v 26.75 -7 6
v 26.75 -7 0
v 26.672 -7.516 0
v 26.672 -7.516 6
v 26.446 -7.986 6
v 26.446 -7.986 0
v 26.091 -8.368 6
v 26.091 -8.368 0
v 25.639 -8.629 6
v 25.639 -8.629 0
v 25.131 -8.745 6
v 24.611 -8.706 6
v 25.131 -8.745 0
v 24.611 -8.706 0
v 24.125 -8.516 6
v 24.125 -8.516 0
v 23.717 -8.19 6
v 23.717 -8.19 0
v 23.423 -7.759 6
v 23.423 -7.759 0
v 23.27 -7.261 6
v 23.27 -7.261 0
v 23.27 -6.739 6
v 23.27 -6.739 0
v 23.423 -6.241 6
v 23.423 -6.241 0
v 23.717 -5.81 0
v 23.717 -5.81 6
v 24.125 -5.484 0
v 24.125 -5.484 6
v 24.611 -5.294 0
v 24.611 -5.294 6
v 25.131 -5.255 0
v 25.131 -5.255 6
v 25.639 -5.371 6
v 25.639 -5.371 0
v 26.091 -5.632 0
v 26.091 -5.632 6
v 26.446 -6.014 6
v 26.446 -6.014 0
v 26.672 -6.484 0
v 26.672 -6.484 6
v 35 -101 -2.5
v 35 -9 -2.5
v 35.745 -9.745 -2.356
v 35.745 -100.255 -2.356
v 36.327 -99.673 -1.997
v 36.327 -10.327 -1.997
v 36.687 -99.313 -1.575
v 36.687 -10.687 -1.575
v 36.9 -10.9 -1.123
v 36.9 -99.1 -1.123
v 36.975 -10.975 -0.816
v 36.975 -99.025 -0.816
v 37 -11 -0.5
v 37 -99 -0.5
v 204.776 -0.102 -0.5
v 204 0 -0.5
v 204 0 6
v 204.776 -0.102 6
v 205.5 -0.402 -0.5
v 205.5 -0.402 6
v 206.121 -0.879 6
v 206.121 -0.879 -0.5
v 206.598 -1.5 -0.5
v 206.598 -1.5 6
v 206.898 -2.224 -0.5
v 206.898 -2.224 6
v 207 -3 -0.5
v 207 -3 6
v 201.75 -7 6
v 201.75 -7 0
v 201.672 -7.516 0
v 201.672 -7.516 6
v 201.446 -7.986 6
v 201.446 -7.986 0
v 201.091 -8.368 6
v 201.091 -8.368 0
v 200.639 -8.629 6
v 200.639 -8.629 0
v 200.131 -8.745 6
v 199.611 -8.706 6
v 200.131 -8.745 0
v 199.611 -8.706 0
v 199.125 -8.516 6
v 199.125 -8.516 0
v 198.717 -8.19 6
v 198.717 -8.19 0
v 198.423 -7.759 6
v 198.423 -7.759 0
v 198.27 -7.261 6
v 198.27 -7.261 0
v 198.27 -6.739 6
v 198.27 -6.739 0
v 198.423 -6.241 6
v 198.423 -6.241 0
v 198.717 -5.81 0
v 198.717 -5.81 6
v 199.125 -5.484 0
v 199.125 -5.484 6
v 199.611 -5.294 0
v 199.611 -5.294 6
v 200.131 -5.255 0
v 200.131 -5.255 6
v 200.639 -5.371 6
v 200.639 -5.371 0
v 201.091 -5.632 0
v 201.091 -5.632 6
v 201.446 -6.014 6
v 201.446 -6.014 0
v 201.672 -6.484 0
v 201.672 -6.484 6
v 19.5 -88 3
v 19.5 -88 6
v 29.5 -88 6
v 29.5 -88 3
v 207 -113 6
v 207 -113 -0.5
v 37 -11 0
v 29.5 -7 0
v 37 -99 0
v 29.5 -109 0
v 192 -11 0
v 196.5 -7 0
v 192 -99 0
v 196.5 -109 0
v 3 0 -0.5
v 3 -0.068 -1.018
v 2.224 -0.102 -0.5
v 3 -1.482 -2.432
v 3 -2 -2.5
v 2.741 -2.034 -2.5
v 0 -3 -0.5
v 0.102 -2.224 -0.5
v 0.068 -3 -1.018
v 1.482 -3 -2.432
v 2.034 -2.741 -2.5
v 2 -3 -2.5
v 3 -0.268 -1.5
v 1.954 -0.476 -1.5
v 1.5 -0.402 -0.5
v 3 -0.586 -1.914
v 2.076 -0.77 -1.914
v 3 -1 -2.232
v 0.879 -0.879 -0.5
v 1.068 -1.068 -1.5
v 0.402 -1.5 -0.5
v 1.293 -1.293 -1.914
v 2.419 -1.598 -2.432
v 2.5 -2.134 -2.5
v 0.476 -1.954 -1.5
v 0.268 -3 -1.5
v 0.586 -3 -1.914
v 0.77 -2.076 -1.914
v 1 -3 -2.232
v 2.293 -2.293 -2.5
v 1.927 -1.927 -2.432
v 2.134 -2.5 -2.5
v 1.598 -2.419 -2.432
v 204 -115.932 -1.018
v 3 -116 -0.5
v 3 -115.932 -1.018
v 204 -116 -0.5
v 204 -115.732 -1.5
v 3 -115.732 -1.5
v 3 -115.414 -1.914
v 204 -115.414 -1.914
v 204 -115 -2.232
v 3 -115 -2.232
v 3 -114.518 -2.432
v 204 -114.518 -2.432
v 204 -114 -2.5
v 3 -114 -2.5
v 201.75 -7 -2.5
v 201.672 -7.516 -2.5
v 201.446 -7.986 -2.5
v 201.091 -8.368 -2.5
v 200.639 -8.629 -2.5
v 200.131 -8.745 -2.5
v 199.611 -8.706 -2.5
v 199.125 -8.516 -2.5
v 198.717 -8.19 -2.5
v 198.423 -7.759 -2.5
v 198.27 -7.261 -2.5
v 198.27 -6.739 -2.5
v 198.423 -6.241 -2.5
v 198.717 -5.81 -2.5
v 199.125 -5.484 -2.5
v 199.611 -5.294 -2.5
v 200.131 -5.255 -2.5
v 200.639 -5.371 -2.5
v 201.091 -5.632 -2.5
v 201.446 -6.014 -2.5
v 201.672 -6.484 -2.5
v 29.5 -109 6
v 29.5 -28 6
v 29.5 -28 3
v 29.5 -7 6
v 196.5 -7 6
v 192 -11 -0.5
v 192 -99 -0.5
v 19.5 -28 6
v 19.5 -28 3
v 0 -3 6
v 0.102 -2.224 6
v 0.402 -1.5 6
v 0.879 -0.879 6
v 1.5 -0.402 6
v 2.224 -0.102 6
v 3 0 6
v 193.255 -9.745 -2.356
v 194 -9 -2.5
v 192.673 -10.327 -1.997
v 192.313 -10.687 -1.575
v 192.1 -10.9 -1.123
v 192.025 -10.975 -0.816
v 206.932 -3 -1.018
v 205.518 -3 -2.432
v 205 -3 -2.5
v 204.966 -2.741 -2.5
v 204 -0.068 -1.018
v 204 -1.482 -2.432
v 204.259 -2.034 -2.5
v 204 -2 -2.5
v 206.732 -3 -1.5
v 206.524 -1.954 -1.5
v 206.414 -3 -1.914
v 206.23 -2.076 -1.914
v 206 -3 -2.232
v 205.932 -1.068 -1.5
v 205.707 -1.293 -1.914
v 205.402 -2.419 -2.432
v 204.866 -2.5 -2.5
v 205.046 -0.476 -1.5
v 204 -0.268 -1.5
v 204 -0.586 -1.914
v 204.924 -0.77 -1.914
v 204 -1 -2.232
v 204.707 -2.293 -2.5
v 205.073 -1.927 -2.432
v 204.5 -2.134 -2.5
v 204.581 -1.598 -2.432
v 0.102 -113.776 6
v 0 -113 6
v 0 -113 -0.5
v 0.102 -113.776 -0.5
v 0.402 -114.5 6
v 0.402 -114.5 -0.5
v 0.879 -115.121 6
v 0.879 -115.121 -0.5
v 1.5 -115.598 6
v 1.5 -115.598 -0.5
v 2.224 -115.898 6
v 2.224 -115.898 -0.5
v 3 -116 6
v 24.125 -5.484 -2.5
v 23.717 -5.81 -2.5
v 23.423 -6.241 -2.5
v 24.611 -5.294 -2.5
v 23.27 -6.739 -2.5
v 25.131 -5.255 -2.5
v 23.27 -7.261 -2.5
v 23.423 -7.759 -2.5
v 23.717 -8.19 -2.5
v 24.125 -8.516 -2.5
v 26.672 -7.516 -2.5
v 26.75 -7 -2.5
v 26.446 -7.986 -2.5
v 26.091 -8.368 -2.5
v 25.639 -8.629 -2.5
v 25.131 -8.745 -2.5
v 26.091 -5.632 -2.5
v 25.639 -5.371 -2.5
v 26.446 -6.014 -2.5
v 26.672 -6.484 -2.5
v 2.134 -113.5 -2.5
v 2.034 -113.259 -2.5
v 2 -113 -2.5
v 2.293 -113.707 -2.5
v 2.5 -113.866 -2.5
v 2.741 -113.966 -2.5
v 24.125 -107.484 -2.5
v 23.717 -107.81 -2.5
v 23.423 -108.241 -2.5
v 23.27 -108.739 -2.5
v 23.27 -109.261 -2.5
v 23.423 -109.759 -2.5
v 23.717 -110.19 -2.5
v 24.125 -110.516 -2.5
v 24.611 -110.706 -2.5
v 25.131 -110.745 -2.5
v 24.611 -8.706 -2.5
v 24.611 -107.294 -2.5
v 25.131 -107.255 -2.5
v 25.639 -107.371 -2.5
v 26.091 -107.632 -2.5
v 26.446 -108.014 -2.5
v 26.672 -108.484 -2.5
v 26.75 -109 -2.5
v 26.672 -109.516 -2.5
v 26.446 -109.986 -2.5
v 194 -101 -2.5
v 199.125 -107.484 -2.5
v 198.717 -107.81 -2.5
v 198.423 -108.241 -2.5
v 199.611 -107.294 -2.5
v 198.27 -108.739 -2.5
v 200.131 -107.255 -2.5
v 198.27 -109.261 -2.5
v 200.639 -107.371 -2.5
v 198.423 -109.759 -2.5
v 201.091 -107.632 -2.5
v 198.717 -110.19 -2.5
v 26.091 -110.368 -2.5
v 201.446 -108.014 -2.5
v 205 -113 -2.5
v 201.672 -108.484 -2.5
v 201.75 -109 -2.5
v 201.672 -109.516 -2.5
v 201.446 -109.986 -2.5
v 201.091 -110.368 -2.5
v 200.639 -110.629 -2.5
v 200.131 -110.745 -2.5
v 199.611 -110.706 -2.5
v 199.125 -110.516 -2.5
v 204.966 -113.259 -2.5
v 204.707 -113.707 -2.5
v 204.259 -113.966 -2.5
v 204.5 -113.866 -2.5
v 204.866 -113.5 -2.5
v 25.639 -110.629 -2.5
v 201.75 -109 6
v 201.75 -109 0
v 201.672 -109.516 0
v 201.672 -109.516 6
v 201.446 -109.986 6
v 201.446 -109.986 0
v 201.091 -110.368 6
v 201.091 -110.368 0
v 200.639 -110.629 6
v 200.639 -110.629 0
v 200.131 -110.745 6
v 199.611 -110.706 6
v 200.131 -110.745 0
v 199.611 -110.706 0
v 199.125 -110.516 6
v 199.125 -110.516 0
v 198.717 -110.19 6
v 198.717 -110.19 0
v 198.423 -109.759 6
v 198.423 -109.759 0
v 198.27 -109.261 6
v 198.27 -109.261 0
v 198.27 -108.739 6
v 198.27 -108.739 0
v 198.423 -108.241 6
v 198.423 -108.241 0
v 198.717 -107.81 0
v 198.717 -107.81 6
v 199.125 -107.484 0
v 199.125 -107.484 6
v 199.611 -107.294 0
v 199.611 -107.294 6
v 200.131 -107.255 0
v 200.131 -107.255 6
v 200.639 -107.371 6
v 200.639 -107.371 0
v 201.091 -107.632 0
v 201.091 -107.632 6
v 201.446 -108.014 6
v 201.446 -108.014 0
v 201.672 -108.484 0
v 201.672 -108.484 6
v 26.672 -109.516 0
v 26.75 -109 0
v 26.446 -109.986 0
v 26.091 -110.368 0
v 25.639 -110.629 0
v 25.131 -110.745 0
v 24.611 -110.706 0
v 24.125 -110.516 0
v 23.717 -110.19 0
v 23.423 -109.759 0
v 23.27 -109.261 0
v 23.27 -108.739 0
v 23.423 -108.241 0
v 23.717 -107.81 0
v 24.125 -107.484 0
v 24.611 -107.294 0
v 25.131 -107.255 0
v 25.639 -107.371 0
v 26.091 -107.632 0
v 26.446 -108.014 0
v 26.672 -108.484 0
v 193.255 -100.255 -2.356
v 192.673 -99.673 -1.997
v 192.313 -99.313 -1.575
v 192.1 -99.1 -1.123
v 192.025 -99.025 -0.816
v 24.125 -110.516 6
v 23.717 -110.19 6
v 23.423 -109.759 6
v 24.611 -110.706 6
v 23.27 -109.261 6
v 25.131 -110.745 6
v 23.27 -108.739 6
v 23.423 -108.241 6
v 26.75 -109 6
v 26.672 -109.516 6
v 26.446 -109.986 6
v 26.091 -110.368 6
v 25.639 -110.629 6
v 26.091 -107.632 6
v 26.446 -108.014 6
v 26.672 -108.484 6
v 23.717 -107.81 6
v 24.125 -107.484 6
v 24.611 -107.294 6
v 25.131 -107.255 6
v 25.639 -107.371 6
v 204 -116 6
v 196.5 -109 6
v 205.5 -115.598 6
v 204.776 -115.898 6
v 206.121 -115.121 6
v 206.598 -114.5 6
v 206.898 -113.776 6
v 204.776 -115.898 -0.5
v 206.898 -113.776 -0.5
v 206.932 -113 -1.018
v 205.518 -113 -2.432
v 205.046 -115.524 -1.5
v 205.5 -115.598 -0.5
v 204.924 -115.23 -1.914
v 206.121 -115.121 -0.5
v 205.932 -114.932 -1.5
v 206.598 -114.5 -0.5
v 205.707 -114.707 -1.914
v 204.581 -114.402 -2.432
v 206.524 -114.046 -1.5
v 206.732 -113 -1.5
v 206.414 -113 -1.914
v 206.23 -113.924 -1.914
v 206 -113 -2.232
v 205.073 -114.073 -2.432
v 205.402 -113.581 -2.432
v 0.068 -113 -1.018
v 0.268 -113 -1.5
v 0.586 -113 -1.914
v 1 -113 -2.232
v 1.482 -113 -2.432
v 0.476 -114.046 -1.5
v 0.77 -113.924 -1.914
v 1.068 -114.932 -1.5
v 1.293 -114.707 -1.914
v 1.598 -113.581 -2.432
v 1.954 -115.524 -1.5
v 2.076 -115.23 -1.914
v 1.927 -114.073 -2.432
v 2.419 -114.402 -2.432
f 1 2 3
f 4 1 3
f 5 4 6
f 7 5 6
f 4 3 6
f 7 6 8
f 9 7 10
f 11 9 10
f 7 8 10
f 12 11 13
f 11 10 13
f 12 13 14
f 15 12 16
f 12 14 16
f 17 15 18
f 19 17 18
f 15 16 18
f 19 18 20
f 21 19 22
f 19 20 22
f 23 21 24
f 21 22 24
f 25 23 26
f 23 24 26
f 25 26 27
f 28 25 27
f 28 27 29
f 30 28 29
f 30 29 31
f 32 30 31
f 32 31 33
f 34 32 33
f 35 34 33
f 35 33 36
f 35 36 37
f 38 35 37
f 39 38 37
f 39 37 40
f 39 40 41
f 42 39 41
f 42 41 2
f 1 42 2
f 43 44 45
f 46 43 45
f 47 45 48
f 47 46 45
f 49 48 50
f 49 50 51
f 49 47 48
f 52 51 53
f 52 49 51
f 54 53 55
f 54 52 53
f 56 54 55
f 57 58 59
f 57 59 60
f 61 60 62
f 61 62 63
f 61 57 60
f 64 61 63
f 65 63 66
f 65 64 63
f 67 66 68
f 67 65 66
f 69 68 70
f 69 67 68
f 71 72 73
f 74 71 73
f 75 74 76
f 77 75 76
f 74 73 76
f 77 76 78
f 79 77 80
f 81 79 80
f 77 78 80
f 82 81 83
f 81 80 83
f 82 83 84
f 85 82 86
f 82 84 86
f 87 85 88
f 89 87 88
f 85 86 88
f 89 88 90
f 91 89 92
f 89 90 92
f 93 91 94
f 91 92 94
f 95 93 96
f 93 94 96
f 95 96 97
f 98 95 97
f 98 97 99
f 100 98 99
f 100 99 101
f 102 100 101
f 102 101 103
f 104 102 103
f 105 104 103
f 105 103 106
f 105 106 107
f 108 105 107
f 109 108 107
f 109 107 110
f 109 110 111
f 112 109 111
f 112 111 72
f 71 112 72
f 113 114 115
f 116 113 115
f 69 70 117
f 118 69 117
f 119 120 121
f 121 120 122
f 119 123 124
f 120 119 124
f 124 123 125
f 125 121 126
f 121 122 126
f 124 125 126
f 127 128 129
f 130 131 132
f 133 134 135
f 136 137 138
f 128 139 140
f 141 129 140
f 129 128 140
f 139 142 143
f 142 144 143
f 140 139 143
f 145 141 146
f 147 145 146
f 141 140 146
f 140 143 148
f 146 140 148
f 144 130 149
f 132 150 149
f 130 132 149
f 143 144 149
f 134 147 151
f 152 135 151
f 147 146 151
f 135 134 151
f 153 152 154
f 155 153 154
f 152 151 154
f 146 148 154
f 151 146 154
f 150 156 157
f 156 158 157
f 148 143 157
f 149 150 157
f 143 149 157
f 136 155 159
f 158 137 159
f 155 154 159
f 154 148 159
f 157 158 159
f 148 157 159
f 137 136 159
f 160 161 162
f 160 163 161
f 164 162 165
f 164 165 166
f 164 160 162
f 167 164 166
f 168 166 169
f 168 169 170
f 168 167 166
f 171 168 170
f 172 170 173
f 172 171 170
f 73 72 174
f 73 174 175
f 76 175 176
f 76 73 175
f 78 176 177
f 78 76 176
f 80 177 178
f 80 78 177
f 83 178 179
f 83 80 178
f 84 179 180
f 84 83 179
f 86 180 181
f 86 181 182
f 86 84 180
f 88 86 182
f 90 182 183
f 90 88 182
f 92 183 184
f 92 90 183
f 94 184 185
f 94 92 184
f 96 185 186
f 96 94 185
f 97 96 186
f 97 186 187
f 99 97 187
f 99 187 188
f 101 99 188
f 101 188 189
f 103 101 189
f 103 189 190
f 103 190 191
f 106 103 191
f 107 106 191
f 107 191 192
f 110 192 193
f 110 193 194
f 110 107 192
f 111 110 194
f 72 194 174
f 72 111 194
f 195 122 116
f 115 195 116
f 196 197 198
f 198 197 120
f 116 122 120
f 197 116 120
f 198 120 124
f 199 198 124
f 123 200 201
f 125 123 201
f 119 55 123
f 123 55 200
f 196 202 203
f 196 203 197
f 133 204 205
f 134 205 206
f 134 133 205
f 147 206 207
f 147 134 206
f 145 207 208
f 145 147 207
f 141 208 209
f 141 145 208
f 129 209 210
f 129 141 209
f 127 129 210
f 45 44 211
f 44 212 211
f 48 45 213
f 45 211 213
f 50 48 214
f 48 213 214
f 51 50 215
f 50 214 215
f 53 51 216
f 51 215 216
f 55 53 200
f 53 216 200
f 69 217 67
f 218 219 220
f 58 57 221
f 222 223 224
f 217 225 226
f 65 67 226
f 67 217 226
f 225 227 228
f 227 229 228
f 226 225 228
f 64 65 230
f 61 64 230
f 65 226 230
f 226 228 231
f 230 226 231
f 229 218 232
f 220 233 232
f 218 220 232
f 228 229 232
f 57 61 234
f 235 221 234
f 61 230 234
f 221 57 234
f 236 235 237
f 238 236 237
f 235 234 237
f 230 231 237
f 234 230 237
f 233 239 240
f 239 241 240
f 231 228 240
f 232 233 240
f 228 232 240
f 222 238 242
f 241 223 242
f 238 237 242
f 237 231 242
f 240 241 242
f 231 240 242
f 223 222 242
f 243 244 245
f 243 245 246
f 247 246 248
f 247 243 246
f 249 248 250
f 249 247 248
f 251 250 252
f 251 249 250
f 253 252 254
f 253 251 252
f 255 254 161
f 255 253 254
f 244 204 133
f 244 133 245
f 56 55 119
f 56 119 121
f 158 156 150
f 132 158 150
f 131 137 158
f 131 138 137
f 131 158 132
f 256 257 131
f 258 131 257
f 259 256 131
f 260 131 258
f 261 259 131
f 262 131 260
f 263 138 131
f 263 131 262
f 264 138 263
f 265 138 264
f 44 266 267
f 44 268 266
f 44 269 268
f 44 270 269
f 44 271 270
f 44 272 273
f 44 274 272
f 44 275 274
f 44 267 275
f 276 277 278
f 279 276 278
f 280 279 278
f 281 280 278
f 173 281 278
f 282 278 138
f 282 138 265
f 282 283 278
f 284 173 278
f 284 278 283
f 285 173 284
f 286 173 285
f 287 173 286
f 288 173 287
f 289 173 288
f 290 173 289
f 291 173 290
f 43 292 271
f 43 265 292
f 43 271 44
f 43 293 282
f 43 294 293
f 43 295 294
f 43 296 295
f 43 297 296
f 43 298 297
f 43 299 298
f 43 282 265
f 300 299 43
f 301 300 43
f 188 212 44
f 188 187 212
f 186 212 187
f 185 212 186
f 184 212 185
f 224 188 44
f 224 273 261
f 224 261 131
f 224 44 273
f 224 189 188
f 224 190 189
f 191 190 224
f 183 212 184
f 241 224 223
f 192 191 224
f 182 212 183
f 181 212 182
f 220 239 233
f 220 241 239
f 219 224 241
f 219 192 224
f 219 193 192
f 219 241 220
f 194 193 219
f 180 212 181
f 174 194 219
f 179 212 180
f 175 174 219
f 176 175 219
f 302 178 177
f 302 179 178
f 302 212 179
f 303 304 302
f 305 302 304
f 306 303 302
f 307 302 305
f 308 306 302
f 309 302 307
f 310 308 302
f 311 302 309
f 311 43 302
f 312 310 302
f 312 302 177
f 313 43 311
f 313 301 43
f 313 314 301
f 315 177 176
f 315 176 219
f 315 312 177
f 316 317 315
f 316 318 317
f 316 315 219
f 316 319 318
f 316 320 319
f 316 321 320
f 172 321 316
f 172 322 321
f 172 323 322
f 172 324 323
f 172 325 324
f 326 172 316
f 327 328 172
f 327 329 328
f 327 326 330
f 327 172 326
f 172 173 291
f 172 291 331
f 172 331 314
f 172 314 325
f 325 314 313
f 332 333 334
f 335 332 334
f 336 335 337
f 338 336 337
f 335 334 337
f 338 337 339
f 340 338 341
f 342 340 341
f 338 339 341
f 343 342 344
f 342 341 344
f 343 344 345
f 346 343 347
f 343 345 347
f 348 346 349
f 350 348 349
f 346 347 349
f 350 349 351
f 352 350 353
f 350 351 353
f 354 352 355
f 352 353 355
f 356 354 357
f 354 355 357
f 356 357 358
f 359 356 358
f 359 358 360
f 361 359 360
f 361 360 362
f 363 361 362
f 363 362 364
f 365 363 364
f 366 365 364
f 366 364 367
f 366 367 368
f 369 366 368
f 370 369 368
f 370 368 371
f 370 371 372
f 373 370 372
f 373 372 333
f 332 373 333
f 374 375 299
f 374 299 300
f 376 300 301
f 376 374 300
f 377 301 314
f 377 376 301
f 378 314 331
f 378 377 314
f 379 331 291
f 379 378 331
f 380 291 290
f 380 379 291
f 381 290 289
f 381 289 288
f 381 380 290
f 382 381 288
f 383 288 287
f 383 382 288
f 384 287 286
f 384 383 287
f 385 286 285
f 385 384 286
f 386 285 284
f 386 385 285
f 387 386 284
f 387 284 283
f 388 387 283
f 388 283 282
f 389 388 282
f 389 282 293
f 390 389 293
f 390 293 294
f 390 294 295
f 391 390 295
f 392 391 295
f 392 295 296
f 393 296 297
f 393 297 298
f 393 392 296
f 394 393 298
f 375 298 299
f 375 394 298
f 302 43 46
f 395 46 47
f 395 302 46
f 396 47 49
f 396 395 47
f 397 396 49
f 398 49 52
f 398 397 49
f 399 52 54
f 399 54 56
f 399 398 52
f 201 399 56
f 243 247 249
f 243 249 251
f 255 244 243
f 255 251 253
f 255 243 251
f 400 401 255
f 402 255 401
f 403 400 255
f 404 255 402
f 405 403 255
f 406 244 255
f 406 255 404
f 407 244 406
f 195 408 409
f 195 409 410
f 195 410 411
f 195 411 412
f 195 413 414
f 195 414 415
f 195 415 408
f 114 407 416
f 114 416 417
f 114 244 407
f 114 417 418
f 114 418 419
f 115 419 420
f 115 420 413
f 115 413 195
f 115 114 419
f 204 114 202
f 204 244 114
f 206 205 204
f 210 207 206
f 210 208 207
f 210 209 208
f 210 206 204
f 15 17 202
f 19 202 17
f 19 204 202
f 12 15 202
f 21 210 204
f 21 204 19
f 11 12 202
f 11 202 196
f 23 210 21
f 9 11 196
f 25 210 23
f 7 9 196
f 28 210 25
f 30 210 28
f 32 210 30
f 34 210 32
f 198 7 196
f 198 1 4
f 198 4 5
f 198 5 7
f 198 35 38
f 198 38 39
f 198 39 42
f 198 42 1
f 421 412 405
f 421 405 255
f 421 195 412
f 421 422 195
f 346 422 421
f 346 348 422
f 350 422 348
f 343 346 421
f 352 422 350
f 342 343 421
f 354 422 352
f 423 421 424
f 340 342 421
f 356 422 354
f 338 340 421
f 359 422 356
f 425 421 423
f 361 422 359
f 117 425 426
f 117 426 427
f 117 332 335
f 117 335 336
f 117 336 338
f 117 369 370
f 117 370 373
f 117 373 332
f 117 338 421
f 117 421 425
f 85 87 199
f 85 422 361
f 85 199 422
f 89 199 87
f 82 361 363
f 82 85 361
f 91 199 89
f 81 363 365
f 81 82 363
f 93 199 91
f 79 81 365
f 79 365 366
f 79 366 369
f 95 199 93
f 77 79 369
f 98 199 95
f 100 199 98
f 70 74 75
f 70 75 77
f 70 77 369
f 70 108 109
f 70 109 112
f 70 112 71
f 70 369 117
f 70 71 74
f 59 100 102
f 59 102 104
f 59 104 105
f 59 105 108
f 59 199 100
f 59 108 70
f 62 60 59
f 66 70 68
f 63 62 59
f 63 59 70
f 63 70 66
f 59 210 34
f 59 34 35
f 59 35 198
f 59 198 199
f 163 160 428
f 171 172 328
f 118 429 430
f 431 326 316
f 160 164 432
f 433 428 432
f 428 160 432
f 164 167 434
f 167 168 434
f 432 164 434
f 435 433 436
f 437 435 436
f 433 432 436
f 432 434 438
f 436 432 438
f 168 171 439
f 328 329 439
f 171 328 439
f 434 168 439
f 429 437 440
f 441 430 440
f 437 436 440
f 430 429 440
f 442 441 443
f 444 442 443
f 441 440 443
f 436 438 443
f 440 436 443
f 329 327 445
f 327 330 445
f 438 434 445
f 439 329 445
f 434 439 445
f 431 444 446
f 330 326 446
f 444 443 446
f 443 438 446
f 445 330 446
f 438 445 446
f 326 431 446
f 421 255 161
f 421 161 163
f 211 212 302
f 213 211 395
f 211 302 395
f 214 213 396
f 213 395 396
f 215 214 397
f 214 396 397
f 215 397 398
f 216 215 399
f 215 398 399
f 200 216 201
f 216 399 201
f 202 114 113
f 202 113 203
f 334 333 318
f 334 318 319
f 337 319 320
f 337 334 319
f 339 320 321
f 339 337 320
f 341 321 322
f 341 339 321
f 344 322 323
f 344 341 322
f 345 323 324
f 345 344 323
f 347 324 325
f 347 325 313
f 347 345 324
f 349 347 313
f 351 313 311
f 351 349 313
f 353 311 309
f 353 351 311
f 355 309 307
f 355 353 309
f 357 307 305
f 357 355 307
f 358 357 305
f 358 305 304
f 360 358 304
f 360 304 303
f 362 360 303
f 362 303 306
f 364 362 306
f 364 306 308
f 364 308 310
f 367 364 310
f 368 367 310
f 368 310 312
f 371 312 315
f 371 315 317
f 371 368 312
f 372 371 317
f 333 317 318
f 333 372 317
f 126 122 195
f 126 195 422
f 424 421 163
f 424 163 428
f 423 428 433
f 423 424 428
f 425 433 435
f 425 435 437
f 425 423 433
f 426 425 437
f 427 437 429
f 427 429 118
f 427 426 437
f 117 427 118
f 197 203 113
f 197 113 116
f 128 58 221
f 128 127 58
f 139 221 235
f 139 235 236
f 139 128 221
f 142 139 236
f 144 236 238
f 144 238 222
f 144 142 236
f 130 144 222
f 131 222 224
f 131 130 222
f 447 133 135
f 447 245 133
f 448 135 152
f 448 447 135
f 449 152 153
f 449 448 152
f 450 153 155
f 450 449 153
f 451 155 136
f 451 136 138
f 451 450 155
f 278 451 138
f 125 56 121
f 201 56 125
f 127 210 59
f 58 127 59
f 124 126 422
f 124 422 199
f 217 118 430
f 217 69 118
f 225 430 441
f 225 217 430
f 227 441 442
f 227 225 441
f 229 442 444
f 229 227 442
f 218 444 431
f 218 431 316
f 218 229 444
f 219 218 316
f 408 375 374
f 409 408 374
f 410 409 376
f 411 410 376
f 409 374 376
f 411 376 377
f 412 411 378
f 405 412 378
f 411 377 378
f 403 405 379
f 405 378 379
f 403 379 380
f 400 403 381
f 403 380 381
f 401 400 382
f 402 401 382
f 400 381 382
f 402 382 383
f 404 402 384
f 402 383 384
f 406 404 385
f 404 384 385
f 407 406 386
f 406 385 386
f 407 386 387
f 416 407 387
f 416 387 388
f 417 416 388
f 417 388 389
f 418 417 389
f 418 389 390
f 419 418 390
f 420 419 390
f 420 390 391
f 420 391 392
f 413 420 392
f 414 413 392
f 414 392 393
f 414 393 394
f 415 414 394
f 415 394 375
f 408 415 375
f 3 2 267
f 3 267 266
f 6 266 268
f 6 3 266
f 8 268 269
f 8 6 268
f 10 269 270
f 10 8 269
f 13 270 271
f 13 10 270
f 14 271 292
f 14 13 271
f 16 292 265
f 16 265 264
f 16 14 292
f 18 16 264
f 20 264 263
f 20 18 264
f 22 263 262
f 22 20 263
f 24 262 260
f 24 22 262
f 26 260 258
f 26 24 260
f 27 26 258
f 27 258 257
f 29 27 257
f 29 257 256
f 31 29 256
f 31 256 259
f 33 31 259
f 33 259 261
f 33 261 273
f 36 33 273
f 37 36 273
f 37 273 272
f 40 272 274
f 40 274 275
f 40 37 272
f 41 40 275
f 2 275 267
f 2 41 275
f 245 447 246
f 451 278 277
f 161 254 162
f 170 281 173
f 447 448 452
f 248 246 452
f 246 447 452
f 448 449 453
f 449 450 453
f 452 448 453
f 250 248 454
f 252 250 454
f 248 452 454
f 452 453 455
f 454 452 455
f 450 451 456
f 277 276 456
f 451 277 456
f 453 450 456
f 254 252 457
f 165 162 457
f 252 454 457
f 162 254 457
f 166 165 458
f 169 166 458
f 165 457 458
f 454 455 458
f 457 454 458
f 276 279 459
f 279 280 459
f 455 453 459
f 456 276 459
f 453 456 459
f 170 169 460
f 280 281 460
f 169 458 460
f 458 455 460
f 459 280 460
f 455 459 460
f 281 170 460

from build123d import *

# Parameters (mm, degrees)
F0_W      = 207
F0_H      = 116
F1_DEPTH  = 6
F2_W      = 167
F2_H      = 102
F3_DEPTH  = 6
F4_R      = 1.75
F5_DEPTH  = 25
F6_W      = 10
F6_H      = 60
F7_DEPTH  = 3
F8_W      = 207
F8_H      = 116
F8_R      = 1.75
F8_W_2    = 167
F8_H_2    = 102
F9_DEPTH  = 2.5
F10_W     = 155
F10_H     = 88
F11_DEPTH = 25
F13_R     = 3
F14_R     = 2


with BuildPart() as f1:
    # F0 (on Top) → F1 (new body)
    with BuildSketch(Plane.XY):
        with Locations((103.5, -58)):
            Rectangle(F0_W, F0_H)
    extrude(amount=F1_DEPTH)

    # F2 (on face) → F3 (cut)
    with BuildSketch(Plane.XY):
        with Locations((113, -58)):
            Rectangle(F2_W, F2_H)
    extrude(amount=F3_DEPTH, mode=Mode.SUBTRACT)

    # F4 (on face) → F5 (cut)
    with BuildSketch(Plane(origin=(0, 0, 0), x_dir=(1, 0, 0), z_dir=(0, 0, -1))):
        with Locations((200, 7)):
            Circle(F4_R)
        with Locations((200, 109)):
            Circle(F4_R)
        with Locations((25, 109)):
            Circle(F4_R)
        with Locations((25, 7)):
            Circle(F4_R)
    extrude(amount=-F5_DEPTH, mode=Mode.SUBTRACT)

    # F6 (on face) → F7 (cut)
    with BuildSketch(Plane.XY.offset(6)):
        with Locations((24.5, -58)):
            Rectangle(F6_W, F6_H)
    extrude(amount=-F7_DEPTH, mode=Mode.SUBTRACT)

    # F8 (on face) → F9 (join)
    with BuildSketch(Plane(origin=(0, 0, 0), x_dir=(1, 0, 0), z_dir=(0, 0, -1))):
        with Locations((103.5, 58)):
            Rectangle(F8_W, F8_H)
        with Locations((25, 7)):
            Circle(F8_R, mode=Mode.SUBTRACT)
        with Locations((200, 7)):
            Circle(F8_R, mode=Mode.SUBTRACT)
        with Locations((25, 109)):
            Circle(F8_R, mode=Mode.SUBTRACT)
        with Locations((113, 58)):
            Rectangle(F8_W_2, F8_H_2, mode=Mode.SUBTRACT)
        with Locations((200, 109)):
            Circle(F8_R, mode=Mode.SUBTRACT)
        with Locations((113, 58)):
            Rectangle(F8_W_2, F8_H_2)
    extrude(amount=F9_DEPTH)

    # F10 (on face) → F11 (cut)
    with BuildSketch(Plane(origin=(0, 0, -2.5), x_dir=(1, 0, 0), z_dir=(0, 0, -1))):
        with Locations((114.5, 55)):
            Rectangle(F10_W, F10_H)
    extrude(amount=-F11_DEPTH, mode=Mode.SUBTRACT)

    # F13
    f13_edges = [f1.edges().sort_by_distance(p)[0] for p in [
        (207, 0, 1.75),
        (0, 0, 1.75),
        (207, -116, 1.75),
        (0, -116, 1.75),
    ]]
    fillet(f13_edges, radius=F13_R)

    # F14
    f14_edges = [f1.edges().sort_by_distance(p)[0] for p in [
        (0, -58, -2.5),
        (114.5, -99, -2.5),
        (37, -55, -2.5),
        (192, -55, -2.5),
        (114.5, -11, -2.5),
        (103.5, 0, -2.5),
        (206.12132, -0.87868, -2.5),
        (0.87868, -0.87868, -2.5),
        (207, -58, -2.5),
        (0.87868, -115.12132, -2.5),
        (206.12132, -115.12132, -2.5),
        (103.5, -116, -2.5),
    ]]
    fillet(f14_edges, radius=F14_R)


solid = f1.part
